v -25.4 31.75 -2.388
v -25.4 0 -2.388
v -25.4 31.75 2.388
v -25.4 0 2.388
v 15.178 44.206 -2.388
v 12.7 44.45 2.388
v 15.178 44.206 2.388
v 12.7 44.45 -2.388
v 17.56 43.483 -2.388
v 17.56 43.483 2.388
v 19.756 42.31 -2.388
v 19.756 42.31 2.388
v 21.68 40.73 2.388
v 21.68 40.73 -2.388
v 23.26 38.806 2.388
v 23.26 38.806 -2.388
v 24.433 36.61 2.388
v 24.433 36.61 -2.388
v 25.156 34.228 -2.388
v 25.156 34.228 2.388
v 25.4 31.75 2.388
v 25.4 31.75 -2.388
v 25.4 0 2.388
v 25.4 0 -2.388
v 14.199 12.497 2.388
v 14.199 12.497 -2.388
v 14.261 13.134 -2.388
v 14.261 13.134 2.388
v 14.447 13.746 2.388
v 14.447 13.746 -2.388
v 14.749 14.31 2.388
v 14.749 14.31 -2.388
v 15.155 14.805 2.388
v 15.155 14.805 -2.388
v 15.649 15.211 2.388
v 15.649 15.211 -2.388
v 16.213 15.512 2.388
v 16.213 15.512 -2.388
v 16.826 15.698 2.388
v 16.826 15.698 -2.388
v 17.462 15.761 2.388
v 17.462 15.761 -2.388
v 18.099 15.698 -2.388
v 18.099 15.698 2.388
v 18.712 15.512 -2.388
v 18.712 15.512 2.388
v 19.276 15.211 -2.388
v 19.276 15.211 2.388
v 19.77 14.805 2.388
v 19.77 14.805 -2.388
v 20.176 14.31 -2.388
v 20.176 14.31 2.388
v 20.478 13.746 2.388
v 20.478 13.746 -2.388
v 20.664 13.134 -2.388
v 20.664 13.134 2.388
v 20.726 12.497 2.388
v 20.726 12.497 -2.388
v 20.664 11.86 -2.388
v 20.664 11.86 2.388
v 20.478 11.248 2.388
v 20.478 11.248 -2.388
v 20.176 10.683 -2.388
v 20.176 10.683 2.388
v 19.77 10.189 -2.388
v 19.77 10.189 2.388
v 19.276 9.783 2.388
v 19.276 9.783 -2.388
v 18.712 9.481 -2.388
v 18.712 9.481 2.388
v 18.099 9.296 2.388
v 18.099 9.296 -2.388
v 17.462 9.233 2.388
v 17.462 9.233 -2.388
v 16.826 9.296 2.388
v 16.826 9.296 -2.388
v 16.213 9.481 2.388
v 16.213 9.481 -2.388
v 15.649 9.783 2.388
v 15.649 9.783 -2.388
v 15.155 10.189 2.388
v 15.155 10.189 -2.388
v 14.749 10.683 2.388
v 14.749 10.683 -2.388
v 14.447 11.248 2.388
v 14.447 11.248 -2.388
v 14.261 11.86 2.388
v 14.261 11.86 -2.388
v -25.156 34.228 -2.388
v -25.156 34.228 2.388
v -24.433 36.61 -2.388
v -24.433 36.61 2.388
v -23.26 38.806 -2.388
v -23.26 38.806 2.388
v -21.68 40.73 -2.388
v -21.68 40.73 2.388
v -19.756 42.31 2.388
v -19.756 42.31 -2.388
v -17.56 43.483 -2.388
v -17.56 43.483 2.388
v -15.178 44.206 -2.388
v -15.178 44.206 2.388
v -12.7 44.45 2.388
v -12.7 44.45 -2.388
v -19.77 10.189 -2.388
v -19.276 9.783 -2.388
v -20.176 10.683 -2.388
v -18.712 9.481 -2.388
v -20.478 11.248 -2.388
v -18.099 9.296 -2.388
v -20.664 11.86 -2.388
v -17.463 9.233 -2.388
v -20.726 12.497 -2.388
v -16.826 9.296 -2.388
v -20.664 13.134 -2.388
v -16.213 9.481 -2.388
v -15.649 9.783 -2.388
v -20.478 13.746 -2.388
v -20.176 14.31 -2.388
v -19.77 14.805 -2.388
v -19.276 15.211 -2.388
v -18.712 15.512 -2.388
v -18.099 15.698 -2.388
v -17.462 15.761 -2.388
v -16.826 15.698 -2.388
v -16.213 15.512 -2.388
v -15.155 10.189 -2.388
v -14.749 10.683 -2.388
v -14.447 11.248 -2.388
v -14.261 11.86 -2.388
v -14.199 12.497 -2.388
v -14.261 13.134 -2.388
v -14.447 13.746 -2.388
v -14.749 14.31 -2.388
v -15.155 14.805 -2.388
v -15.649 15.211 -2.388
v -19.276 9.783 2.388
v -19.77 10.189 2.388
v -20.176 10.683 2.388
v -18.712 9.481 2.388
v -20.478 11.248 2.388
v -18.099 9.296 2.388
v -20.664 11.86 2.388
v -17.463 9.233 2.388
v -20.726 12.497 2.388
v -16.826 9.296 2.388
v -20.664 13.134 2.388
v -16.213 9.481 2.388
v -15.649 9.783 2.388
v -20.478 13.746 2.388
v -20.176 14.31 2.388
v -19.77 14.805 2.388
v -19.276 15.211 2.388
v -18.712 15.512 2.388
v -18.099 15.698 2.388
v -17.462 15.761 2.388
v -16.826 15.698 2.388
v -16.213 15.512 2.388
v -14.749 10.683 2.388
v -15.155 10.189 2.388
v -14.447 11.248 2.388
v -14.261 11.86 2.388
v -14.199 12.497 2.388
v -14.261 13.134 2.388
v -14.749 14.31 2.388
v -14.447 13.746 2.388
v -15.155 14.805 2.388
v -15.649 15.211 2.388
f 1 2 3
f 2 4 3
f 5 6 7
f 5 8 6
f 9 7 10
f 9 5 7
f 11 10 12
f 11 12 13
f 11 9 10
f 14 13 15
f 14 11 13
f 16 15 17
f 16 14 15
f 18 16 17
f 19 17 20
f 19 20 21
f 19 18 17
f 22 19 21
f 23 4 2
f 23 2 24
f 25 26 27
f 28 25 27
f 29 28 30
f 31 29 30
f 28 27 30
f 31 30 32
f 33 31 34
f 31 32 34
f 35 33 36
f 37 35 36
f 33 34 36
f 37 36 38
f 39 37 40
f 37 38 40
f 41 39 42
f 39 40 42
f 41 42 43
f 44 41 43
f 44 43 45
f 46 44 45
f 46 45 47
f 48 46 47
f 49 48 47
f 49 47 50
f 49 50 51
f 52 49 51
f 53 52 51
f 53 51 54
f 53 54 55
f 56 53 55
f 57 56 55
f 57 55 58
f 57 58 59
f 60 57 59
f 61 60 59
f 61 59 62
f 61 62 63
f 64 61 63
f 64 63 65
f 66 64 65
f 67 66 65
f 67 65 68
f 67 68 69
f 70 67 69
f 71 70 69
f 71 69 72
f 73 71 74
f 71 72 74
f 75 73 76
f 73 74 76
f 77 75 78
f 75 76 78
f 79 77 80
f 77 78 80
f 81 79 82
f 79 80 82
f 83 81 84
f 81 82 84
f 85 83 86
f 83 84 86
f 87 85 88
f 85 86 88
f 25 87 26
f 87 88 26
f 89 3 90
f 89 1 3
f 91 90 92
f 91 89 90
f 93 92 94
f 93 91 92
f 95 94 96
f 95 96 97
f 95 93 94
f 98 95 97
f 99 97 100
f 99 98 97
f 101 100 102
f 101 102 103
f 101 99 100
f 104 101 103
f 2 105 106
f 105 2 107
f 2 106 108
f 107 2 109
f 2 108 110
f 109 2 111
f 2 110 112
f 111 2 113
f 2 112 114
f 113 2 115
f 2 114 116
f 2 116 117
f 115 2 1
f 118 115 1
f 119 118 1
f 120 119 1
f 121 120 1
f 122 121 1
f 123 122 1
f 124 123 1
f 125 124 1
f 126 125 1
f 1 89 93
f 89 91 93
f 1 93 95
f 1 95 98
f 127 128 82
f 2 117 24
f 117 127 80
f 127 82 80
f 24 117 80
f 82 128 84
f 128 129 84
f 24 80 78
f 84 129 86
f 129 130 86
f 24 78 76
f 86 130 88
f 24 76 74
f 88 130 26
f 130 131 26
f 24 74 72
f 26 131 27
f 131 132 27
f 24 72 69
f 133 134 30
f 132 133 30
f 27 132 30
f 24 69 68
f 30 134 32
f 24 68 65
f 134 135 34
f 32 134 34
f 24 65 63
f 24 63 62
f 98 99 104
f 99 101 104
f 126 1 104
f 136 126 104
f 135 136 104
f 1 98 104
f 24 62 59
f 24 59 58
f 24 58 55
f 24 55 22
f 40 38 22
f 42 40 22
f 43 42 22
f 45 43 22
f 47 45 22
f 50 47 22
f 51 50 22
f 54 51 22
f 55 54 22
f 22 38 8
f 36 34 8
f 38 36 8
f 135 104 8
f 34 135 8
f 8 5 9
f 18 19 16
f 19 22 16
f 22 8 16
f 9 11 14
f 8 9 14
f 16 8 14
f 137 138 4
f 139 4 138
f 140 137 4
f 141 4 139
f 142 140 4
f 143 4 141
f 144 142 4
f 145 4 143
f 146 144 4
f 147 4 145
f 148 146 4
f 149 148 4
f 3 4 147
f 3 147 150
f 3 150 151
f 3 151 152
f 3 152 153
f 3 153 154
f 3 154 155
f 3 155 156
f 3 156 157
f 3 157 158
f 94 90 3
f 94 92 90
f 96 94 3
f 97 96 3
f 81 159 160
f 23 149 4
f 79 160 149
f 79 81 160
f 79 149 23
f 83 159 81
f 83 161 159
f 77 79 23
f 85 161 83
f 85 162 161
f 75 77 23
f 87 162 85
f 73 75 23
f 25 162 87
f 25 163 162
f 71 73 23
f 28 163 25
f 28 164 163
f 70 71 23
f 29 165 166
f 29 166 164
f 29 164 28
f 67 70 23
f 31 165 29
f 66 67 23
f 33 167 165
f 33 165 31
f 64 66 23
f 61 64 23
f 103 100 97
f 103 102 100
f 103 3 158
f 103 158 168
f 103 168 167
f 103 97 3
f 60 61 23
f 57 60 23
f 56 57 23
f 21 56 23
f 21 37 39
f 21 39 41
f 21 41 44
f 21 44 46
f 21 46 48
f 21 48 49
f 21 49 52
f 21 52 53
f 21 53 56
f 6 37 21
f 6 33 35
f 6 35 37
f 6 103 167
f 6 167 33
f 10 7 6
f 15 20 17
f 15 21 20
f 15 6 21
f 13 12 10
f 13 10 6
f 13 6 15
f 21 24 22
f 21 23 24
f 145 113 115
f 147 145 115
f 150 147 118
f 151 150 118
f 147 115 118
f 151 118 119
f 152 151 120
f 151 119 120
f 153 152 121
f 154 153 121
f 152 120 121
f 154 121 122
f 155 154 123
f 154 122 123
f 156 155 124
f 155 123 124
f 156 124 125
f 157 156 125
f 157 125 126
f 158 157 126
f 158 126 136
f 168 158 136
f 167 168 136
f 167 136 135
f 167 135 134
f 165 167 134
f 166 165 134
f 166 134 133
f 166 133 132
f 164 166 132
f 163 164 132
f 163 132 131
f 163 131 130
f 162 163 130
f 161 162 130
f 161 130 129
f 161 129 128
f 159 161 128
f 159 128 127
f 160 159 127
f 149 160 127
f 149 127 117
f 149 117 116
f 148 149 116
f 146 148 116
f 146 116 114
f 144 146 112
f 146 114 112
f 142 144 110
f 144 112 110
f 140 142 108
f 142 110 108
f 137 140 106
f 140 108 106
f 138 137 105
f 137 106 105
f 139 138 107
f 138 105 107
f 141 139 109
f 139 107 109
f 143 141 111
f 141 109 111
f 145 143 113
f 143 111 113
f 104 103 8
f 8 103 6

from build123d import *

# Parameters (mm, degrees)
SKETCH1_W                = 50.8
SKETCH1_H                = 44.45
BOSS_EXTRUDE1_DEPTH      = 2.3876
F_0_257_DIAMETER_HOLE1_D = 6.5278
FILLET1_R                = 12.7


with BuildPart() as part:
    # Sketch1 → Boss-Extrude1 (new body, symmetric)
    with BuildSketch(Plane.XY):
        with Locations((0, 22.225)):
            Rectangle(SKETCH1_W, SKETCH1_H)
    extrude(amount=BOSS_EXTRUDE1_DEPTH, both=True)

    # F (0.257) Diameter Hole1 (through all)
    with Locations(Plane.XY.offset(2.3876)):
        with Locations((-17.4625, 12.4968), (17.4625, 12.4968)):
            Hole(F_0_257_DIAMETER_HOLE1_D / 2)

    # Fillet1
    fillet1_edges = [part.edges().sort_by_distance(p)[0] for p in [
        (-25.4, 44.45, 0),
        (25.4, 44.45, 0),
    ]]
    fillet(fillet1_edges, radius=FILLET1_R)


solid = part.part
